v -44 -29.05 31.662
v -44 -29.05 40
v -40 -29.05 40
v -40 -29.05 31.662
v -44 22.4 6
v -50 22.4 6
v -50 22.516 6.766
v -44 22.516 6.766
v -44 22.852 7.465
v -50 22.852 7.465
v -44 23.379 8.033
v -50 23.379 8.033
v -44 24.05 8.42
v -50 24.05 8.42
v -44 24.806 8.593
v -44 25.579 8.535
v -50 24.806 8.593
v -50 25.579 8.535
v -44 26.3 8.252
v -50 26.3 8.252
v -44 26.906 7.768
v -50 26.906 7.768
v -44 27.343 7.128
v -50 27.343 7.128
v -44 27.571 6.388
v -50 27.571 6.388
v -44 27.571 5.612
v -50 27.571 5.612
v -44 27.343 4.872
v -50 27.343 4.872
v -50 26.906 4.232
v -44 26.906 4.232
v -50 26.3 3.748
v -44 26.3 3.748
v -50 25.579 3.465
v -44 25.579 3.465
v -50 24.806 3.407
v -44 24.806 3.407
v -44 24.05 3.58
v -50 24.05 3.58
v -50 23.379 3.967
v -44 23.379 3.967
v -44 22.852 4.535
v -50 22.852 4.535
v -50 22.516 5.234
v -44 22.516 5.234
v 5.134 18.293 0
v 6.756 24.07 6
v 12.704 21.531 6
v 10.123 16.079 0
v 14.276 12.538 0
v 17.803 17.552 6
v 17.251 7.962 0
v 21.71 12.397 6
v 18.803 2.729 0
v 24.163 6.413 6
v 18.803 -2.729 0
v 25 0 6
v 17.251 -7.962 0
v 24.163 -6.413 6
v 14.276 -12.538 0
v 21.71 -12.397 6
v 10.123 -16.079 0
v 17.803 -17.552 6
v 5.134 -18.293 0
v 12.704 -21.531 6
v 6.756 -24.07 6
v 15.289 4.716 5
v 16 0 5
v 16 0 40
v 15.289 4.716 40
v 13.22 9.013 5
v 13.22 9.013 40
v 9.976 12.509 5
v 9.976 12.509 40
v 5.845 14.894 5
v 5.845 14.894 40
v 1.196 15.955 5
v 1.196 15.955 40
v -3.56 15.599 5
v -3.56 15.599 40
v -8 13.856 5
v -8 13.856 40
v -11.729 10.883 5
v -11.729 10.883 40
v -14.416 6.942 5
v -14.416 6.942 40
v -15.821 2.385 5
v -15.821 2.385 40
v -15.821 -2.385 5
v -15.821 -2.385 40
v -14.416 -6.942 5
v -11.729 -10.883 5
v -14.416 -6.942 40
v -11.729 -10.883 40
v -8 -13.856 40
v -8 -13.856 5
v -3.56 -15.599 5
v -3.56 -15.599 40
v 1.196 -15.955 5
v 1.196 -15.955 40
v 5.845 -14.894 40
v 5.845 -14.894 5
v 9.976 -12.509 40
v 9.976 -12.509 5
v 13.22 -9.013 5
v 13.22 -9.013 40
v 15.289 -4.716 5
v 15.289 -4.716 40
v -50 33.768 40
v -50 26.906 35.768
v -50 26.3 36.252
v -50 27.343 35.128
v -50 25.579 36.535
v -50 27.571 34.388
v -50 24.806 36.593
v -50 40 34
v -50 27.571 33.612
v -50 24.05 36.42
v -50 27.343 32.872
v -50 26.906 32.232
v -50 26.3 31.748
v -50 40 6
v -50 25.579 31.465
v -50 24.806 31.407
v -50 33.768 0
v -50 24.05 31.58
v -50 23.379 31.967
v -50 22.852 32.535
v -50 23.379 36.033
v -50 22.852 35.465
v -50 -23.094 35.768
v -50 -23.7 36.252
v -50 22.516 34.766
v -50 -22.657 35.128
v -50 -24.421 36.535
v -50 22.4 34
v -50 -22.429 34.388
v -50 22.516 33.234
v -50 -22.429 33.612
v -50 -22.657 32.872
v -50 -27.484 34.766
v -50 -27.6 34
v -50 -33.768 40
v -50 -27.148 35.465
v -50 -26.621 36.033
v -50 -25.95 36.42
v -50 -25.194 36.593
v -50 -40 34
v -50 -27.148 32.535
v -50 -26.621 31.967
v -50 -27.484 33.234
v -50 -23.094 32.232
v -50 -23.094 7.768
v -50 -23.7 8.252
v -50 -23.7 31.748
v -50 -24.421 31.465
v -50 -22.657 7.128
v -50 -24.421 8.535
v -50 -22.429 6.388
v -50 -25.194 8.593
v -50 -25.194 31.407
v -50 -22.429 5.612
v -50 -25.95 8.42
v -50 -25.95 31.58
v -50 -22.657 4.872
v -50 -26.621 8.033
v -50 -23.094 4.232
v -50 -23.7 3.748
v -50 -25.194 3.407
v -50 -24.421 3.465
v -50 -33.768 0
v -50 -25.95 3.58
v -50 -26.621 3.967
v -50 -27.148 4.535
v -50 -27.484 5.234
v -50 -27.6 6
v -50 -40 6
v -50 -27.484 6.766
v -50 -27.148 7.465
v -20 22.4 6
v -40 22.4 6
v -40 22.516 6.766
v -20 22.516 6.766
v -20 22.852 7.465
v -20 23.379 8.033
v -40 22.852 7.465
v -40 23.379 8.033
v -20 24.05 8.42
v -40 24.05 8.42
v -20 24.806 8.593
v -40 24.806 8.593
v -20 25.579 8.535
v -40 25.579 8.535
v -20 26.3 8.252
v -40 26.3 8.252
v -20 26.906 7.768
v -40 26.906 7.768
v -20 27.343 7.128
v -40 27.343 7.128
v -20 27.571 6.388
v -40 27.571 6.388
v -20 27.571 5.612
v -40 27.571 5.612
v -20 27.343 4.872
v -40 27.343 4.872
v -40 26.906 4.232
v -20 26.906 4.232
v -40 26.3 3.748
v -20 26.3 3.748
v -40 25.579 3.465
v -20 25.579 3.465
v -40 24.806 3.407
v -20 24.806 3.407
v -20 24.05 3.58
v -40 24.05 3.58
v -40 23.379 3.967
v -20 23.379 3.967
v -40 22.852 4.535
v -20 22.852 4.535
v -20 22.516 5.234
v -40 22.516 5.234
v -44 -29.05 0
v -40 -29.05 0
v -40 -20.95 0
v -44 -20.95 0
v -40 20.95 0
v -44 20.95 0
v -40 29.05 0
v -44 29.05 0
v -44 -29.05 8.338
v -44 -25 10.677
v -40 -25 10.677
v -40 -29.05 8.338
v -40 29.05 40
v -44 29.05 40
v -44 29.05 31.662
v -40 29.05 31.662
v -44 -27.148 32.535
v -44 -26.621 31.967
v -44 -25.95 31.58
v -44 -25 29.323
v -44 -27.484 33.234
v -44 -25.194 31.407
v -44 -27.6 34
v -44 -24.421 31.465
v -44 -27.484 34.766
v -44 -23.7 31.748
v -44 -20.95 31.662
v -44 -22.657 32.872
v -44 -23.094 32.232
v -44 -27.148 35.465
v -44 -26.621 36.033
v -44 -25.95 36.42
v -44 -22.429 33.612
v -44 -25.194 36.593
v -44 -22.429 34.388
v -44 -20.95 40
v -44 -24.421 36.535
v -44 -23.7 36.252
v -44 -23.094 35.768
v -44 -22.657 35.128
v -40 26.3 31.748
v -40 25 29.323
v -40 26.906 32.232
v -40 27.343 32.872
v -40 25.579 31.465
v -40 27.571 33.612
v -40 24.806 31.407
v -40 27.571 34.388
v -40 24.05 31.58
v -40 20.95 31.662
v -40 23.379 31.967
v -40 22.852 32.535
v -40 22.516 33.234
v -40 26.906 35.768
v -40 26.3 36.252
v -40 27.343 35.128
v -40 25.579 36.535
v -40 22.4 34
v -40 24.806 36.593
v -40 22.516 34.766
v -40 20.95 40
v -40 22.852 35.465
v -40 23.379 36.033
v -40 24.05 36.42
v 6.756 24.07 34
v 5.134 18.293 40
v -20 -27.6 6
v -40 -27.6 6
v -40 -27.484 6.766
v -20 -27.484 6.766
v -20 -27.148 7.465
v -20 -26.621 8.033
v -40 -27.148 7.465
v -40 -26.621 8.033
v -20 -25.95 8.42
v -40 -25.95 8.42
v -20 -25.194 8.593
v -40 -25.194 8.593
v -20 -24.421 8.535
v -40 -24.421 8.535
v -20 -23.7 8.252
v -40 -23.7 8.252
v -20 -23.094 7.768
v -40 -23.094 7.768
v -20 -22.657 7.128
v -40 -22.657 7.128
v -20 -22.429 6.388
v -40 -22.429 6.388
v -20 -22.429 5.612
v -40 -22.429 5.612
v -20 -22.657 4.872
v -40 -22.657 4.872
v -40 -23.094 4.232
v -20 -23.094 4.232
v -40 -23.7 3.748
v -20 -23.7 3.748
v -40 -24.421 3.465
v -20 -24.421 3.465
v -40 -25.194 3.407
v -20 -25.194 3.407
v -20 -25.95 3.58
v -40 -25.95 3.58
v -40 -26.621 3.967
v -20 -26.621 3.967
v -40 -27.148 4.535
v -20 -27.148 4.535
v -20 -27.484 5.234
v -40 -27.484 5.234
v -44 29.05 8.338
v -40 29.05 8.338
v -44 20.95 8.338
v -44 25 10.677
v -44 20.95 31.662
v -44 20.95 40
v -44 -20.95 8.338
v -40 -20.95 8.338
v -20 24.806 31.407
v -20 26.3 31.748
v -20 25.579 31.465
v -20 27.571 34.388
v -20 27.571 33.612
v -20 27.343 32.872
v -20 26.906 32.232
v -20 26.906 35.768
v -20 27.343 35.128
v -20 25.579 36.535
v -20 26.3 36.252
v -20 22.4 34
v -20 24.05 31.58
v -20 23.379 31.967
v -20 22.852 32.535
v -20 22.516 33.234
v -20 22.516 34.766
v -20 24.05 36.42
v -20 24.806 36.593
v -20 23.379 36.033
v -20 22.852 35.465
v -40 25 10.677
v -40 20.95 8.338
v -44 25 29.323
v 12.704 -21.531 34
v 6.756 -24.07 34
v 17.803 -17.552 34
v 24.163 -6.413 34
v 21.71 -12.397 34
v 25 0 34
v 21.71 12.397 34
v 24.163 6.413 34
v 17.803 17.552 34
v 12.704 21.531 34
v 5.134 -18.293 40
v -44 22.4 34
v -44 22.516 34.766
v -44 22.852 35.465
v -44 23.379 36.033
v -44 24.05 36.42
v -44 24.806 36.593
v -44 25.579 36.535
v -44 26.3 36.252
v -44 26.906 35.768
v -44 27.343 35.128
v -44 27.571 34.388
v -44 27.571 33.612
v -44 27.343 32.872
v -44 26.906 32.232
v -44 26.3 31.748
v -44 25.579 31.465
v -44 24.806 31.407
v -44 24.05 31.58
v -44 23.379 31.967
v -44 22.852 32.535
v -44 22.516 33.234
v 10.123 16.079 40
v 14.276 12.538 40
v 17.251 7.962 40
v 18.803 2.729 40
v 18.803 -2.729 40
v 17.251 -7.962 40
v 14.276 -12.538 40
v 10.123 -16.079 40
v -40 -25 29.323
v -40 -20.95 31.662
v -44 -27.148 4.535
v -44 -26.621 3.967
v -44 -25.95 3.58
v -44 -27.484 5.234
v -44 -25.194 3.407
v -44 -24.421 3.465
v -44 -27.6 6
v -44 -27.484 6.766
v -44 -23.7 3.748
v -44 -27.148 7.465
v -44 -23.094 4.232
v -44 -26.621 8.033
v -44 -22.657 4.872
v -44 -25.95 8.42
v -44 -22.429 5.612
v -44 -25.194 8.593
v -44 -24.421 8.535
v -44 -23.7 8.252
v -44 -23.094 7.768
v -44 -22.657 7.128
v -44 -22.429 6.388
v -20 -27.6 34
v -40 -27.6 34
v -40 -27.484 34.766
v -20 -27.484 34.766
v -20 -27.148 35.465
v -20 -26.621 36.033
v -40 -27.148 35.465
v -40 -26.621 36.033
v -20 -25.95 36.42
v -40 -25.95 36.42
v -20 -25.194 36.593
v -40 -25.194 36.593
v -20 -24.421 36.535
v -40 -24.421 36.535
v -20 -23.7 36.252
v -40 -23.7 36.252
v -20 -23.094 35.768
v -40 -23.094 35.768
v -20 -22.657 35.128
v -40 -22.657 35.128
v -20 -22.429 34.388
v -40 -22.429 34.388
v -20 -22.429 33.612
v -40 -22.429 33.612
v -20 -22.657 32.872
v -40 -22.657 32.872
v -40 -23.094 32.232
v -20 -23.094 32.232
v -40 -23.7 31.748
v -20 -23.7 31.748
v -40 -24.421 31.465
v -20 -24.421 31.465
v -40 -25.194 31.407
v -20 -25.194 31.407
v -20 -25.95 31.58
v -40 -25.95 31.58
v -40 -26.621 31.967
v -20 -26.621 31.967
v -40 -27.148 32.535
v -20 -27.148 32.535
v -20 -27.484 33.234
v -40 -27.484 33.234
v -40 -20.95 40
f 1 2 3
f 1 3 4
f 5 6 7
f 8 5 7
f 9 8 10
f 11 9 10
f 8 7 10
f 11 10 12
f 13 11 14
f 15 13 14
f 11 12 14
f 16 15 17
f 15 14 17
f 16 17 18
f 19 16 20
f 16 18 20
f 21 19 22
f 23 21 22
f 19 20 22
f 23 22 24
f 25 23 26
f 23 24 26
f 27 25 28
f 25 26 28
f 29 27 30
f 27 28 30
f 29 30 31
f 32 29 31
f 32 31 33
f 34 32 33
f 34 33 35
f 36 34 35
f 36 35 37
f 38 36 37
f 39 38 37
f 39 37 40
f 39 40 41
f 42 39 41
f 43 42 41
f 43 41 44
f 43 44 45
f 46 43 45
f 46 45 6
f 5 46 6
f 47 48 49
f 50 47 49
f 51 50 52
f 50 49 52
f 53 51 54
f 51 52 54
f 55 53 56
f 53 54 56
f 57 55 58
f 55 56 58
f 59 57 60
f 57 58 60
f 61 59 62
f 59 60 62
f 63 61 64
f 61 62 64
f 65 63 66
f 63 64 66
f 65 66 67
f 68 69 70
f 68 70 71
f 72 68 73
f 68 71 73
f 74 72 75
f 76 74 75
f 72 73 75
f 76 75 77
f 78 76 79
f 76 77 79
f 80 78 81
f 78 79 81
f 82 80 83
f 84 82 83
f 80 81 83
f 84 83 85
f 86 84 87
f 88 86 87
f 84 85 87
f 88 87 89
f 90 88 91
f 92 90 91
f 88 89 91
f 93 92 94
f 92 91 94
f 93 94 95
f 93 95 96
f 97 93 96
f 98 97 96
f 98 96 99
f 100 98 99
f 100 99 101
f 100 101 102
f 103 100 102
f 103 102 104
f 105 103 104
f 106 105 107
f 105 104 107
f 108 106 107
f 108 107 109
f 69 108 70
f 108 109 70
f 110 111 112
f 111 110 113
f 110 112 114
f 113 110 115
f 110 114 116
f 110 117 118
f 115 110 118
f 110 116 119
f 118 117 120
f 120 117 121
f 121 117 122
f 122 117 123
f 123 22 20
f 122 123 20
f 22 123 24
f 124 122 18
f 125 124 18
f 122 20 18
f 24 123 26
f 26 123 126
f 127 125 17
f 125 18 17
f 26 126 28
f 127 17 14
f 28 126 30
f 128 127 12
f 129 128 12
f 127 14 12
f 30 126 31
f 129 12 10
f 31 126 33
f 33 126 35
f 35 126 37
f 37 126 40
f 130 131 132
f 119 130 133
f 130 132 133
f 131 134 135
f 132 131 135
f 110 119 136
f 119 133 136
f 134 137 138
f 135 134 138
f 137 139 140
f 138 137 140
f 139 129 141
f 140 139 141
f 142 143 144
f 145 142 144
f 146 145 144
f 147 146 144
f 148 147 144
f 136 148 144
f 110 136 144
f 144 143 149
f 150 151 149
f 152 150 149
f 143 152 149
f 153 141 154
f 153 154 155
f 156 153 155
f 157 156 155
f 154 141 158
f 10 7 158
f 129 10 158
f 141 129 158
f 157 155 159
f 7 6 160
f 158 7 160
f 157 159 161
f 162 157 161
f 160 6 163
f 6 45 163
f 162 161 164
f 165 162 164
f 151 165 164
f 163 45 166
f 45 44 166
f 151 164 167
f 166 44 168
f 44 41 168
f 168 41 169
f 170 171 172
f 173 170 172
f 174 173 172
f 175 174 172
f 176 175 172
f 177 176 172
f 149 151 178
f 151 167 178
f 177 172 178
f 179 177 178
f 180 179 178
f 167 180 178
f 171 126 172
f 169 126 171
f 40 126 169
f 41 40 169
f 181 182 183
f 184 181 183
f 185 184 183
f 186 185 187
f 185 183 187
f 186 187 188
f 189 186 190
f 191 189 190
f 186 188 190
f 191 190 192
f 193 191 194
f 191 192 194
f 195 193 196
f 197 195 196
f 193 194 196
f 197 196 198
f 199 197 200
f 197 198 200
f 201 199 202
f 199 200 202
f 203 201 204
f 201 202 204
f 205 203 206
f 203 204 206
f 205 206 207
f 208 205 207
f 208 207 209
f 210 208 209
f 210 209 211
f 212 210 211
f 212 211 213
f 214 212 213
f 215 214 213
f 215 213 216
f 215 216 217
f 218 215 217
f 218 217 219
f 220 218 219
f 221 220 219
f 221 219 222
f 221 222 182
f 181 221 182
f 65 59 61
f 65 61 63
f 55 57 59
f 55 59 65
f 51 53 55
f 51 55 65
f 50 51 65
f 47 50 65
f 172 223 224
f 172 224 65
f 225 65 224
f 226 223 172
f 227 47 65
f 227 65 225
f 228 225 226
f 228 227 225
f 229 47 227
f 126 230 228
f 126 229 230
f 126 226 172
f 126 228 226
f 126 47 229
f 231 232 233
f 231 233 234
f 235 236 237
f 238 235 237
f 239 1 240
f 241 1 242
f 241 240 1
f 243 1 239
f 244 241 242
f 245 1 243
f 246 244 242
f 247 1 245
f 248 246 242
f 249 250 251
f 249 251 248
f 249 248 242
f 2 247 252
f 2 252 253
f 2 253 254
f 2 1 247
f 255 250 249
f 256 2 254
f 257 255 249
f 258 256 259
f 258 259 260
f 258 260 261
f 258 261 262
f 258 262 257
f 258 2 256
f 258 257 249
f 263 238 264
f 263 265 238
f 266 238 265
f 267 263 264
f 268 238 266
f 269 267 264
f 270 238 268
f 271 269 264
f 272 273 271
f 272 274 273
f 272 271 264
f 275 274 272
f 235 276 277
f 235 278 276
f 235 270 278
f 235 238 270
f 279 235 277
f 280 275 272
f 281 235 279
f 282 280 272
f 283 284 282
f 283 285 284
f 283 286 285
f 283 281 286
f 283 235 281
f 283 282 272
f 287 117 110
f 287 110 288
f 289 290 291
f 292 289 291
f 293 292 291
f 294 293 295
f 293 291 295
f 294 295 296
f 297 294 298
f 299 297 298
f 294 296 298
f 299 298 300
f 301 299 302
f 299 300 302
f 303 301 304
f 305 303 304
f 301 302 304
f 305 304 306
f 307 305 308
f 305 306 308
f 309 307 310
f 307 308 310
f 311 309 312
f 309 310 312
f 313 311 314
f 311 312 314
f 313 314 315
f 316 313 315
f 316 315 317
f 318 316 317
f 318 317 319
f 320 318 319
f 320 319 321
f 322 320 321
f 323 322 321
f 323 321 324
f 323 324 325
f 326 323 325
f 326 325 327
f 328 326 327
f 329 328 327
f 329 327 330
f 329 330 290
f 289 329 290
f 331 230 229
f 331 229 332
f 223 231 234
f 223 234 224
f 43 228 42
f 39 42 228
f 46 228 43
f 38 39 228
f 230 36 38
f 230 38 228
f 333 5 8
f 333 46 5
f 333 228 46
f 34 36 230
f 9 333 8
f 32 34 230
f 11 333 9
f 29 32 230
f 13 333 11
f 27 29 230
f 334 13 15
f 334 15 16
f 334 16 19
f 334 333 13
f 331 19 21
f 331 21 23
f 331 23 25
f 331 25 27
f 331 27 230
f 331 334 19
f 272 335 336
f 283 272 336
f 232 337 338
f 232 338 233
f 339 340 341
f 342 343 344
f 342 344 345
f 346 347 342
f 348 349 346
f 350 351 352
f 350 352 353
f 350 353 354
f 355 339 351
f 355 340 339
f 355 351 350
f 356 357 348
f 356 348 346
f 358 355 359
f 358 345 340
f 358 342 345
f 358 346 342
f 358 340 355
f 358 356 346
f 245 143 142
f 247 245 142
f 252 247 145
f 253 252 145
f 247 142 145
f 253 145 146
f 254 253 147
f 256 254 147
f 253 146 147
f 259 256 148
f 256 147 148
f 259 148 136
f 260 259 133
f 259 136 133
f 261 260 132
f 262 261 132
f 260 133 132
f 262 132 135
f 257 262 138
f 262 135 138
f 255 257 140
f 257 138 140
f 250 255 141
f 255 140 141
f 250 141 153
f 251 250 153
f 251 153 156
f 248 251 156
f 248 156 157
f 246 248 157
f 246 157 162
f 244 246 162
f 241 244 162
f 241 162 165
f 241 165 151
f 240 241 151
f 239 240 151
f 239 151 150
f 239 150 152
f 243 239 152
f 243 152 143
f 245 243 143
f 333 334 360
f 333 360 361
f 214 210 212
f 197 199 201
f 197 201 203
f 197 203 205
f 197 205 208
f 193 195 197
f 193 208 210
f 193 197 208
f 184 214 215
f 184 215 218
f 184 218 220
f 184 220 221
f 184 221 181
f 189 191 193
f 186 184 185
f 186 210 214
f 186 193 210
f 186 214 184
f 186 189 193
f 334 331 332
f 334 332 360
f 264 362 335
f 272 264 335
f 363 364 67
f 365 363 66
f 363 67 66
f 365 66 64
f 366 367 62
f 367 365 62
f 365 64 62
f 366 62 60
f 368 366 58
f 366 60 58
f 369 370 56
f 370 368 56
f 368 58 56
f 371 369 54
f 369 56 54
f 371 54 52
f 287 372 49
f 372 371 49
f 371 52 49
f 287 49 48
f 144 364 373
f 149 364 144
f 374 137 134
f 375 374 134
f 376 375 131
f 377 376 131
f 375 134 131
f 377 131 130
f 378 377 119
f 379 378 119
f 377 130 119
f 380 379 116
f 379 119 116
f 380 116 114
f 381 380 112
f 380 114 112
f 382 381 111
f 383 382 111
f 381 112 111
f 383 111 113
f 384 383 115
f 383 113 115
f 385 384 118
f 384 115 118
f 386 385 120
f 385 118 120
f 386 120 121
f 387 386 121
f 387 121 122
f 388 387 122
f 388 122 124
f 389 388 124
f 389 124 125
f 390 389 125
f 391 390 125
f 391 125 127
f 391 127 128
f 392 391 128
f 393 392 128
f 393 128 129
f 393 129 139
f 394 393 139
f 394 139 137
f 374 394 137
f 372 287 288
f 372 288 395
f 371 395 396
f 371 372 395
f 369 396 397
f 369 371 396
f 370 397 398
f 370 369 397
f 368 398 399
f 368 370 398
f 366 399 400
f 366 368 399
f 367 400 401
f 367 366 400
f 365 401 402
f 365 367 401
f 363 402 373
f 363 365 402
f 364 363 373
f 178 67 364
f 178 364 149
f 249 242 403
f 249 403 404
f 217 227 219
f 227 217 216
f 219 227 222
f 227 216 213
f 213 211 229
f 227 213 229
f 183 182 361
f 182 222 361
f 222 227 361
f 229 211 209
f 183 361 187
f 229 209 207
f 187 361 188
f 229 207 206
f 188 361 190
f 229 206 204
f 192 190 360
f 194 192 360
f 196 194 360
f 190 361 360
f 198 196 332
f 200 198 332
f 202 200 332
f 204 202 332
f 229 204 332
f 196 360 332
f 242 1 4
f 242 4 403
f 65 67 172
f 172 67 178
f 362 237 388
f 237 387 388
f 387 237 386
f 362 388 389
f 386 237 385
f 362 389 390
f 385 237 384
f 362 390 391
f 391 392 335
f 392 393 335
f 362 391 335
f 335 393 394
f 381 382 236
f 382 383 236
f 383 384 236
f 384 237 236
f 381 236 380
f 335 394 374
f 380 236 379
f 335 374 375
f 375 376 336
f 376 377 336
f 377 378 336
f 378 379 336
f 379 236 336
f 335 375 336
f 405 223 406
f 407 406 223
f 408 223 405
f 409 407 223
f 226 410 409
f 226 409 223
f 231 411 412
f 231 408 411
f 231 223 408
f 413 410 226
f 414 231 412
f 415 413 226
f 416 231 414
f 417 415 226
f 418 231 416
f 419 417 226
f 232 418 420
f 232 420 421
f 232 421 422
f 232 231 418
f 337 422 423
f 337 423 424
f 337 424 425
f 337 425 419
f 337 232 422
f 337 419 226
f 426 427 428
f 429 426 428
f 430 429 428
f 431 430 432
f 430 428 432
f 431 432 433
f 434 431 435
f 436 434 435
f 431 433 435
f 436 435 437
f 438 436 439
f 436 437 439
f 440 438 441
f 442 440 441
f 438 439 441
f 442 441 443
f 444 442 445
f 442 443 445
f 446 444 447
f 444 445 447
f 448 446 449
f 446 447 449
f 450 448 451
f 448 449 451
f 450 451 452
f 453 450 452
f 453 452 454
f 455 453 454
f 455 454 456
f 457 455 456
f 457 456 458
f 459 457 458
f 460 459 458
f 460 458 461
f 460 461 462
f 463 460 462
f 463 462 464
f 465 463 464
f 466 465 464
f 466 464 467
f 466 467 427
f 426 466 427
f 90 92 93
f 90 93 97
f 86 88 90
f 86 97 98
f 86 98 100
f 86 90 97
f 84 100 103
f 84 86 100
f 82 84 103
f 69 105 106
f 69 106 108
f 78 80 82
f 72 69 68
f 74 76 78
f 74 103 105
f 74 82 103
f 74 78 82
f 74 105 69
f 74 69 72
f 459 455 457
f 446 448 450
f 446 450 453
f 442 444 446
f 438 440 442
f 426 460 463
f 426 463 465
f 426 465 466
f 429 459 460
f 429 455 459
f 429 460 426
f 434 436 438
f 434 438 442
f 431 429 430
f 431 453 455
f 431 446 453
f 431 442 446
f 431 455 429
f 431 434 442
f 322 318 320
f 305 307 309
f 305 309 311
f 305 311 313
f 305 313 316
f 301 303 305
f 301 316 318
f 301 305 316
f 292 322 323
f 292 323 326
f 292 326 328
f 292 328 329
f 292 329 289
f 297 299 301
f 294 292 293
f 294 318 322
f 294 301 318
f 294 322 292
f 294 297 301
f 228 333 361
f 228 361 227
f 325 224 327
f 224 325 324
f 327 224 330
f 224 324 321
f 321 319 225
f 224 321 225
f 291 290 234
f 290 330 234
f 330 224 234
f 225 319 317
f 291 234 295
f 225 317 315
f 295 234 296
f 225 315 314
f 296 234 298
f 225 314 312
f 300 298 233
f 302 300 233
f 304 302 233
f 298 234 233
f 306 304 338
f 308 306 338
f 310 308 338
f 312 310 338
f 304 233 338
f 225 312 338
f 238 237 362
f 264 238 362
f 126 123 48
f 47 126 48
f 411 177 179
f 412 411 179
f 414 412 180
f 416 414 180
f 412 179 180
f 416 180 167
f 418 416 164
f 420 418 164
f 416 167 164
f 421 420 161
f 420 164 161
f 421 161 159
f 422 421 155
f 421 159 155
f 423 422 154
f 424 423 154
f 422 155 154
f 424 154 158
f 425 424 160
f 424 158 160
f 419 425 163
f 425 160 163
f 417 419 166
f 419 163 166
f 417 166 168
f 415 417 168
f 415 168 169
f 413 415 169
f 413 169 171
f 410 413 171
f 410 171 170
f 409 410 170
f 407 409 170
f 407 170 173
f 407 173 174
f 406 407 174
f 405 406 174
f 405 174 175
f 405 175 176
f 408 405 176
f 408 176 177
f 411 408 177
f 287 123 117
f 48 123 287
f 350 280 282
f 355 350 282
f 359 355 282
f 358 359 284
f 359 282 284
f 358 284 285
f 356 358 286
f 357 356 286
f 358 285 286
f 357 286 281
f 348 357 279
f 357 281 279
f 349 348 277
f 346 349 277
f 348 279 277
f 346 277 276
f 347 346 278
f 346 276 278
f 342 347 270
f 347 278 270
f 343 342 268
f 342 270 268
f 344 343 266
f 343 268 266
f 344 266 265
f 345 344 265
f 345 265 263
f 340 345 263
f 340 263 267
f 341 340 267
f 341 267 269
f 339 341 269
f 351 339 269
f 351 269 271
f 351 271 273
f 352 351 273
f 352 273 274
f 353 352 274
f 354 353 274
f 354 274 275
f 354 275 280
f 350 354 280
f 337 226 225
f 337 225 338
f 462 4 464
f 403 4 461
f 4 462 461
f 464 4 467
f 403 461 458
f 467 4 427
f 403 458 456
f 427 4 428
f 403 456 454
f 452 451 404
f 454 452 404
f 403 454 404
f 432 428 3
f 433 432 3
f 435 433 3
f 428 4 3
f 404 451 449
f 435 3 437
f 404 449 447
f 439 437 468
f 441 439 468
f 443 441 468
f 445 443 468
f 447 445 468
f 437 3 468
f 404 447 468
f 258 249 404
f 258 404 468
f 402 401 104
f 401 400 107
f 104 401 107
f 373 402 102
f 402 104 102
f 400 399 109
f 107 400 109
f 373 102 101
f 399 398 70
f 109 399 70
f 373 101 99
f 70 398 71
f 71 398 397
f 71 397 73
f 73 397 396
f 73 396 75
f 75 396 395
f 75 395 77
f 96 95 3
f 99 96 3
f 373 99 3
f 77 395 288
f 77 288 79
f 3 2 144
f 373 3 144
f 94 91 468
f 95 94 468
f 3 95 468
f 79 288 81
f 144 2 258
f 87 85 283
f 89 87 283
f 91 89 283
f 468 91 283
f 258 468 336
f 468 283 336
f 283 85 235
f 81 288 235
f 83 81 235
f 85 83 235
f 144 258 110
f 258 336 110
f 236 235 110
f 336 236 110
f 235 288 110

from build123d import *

# Parameters (mm, degrees)
PAD_DEPTH       = 40
SKETCH001_R     = 16
POCKET_DEPTH    = 35
POCKET001_DEPTH = 4
SKETCH003_R     = 2.6
POCKET002_DEPTH = 30
CHAMFER_SIZE    = 6


with BuildPart() as part:
    # Sketch → Pad (new body)
    with BuildSketch(Plane.XY):
        with BuildLine():
            Line((-50, 40), (6.755886, 24.069857))
            ThreePointArc((6.755886, -24.069857), (25, 0), (6.755886, 24.069857))
            Line((6.755886, -24.069857), (-50, -40))
            Line((-50, 40), (-50, -40))
        make_face()
    extrude(amount=PAD_DEPTH)

    # Sketch001 (on Face6 of Pad) → Pocket (cut)
    with BuildSketch(Plane.XY.offset(40)):
        Circle(SKETCH001_R)
    extrude(amount=-POCKET_DEPTH, mode=Mode.SUBTRACT)

    # Sketch002 (on Face2 of Pocket) → Pocket001 (cut)
    with BuildSketch(Plane(origin=(-44, 0, 0), x_dir=(0, -1, 0), z_dir=(-1, 0, 0))):
        Polygon((-29.05, 31.661731), (-25, 29.323463), (-20.95, 31.661731), (-20.95, 51.661731), (-29.05, 51.661731), align=None)
        Polygon((25, 29.323463), (20.95, 31.661731), (20.95, 51.661731), (29.05, 51.661731), (29.05, 31.661731), align=None)
        Polygon((-29.05, 8.338269), (-25, 10.676537), (-20.95, 8.338269), (-20.95, -11.661731), (-29.05, -11.661731), align=None)
        Polygon((20.95, 8.338269), (25, 10.676537), (29.05, 8.338269), (29.05, -11.661731), (20.95, -11.661731), align=None)
    extrude(amount=-POCKET001_DEPTH, mode=Mode.SUBTRACT)

    # Sketch003 (on Face2 of Pocket001) → Pocket002 (cut)
    with BuildSketch(Plane(origin=(-50, 0, 0), x_dir=(0, -1, 0), z_dir=(-1, 0, 0))):
        with Locations((25, 34)):
            Circle(SKETCH003_R)
        with Locations((-25, 6)):
            Circle(SKETCH003_R)
        with Locations((25, 6)):
            Circle(SKETCH003_R)
        with Locations((-25, 34)):
            Circle(SKETCH003_R)
    extrude(amount=-POCKET002_DEPTH, mode=Mode.SUBTRACT)

    # Chamfer
    chamfer_edges = [part.edges().sort_by_distance(p)[0] for p in [
        (-21.622057, -32.034928, 40),
        (-21.622057, -32.034928, 0),
    ]]
    chamfer(chamfer_edges, length=CHAMFER_SIZE)


solid = part.part
